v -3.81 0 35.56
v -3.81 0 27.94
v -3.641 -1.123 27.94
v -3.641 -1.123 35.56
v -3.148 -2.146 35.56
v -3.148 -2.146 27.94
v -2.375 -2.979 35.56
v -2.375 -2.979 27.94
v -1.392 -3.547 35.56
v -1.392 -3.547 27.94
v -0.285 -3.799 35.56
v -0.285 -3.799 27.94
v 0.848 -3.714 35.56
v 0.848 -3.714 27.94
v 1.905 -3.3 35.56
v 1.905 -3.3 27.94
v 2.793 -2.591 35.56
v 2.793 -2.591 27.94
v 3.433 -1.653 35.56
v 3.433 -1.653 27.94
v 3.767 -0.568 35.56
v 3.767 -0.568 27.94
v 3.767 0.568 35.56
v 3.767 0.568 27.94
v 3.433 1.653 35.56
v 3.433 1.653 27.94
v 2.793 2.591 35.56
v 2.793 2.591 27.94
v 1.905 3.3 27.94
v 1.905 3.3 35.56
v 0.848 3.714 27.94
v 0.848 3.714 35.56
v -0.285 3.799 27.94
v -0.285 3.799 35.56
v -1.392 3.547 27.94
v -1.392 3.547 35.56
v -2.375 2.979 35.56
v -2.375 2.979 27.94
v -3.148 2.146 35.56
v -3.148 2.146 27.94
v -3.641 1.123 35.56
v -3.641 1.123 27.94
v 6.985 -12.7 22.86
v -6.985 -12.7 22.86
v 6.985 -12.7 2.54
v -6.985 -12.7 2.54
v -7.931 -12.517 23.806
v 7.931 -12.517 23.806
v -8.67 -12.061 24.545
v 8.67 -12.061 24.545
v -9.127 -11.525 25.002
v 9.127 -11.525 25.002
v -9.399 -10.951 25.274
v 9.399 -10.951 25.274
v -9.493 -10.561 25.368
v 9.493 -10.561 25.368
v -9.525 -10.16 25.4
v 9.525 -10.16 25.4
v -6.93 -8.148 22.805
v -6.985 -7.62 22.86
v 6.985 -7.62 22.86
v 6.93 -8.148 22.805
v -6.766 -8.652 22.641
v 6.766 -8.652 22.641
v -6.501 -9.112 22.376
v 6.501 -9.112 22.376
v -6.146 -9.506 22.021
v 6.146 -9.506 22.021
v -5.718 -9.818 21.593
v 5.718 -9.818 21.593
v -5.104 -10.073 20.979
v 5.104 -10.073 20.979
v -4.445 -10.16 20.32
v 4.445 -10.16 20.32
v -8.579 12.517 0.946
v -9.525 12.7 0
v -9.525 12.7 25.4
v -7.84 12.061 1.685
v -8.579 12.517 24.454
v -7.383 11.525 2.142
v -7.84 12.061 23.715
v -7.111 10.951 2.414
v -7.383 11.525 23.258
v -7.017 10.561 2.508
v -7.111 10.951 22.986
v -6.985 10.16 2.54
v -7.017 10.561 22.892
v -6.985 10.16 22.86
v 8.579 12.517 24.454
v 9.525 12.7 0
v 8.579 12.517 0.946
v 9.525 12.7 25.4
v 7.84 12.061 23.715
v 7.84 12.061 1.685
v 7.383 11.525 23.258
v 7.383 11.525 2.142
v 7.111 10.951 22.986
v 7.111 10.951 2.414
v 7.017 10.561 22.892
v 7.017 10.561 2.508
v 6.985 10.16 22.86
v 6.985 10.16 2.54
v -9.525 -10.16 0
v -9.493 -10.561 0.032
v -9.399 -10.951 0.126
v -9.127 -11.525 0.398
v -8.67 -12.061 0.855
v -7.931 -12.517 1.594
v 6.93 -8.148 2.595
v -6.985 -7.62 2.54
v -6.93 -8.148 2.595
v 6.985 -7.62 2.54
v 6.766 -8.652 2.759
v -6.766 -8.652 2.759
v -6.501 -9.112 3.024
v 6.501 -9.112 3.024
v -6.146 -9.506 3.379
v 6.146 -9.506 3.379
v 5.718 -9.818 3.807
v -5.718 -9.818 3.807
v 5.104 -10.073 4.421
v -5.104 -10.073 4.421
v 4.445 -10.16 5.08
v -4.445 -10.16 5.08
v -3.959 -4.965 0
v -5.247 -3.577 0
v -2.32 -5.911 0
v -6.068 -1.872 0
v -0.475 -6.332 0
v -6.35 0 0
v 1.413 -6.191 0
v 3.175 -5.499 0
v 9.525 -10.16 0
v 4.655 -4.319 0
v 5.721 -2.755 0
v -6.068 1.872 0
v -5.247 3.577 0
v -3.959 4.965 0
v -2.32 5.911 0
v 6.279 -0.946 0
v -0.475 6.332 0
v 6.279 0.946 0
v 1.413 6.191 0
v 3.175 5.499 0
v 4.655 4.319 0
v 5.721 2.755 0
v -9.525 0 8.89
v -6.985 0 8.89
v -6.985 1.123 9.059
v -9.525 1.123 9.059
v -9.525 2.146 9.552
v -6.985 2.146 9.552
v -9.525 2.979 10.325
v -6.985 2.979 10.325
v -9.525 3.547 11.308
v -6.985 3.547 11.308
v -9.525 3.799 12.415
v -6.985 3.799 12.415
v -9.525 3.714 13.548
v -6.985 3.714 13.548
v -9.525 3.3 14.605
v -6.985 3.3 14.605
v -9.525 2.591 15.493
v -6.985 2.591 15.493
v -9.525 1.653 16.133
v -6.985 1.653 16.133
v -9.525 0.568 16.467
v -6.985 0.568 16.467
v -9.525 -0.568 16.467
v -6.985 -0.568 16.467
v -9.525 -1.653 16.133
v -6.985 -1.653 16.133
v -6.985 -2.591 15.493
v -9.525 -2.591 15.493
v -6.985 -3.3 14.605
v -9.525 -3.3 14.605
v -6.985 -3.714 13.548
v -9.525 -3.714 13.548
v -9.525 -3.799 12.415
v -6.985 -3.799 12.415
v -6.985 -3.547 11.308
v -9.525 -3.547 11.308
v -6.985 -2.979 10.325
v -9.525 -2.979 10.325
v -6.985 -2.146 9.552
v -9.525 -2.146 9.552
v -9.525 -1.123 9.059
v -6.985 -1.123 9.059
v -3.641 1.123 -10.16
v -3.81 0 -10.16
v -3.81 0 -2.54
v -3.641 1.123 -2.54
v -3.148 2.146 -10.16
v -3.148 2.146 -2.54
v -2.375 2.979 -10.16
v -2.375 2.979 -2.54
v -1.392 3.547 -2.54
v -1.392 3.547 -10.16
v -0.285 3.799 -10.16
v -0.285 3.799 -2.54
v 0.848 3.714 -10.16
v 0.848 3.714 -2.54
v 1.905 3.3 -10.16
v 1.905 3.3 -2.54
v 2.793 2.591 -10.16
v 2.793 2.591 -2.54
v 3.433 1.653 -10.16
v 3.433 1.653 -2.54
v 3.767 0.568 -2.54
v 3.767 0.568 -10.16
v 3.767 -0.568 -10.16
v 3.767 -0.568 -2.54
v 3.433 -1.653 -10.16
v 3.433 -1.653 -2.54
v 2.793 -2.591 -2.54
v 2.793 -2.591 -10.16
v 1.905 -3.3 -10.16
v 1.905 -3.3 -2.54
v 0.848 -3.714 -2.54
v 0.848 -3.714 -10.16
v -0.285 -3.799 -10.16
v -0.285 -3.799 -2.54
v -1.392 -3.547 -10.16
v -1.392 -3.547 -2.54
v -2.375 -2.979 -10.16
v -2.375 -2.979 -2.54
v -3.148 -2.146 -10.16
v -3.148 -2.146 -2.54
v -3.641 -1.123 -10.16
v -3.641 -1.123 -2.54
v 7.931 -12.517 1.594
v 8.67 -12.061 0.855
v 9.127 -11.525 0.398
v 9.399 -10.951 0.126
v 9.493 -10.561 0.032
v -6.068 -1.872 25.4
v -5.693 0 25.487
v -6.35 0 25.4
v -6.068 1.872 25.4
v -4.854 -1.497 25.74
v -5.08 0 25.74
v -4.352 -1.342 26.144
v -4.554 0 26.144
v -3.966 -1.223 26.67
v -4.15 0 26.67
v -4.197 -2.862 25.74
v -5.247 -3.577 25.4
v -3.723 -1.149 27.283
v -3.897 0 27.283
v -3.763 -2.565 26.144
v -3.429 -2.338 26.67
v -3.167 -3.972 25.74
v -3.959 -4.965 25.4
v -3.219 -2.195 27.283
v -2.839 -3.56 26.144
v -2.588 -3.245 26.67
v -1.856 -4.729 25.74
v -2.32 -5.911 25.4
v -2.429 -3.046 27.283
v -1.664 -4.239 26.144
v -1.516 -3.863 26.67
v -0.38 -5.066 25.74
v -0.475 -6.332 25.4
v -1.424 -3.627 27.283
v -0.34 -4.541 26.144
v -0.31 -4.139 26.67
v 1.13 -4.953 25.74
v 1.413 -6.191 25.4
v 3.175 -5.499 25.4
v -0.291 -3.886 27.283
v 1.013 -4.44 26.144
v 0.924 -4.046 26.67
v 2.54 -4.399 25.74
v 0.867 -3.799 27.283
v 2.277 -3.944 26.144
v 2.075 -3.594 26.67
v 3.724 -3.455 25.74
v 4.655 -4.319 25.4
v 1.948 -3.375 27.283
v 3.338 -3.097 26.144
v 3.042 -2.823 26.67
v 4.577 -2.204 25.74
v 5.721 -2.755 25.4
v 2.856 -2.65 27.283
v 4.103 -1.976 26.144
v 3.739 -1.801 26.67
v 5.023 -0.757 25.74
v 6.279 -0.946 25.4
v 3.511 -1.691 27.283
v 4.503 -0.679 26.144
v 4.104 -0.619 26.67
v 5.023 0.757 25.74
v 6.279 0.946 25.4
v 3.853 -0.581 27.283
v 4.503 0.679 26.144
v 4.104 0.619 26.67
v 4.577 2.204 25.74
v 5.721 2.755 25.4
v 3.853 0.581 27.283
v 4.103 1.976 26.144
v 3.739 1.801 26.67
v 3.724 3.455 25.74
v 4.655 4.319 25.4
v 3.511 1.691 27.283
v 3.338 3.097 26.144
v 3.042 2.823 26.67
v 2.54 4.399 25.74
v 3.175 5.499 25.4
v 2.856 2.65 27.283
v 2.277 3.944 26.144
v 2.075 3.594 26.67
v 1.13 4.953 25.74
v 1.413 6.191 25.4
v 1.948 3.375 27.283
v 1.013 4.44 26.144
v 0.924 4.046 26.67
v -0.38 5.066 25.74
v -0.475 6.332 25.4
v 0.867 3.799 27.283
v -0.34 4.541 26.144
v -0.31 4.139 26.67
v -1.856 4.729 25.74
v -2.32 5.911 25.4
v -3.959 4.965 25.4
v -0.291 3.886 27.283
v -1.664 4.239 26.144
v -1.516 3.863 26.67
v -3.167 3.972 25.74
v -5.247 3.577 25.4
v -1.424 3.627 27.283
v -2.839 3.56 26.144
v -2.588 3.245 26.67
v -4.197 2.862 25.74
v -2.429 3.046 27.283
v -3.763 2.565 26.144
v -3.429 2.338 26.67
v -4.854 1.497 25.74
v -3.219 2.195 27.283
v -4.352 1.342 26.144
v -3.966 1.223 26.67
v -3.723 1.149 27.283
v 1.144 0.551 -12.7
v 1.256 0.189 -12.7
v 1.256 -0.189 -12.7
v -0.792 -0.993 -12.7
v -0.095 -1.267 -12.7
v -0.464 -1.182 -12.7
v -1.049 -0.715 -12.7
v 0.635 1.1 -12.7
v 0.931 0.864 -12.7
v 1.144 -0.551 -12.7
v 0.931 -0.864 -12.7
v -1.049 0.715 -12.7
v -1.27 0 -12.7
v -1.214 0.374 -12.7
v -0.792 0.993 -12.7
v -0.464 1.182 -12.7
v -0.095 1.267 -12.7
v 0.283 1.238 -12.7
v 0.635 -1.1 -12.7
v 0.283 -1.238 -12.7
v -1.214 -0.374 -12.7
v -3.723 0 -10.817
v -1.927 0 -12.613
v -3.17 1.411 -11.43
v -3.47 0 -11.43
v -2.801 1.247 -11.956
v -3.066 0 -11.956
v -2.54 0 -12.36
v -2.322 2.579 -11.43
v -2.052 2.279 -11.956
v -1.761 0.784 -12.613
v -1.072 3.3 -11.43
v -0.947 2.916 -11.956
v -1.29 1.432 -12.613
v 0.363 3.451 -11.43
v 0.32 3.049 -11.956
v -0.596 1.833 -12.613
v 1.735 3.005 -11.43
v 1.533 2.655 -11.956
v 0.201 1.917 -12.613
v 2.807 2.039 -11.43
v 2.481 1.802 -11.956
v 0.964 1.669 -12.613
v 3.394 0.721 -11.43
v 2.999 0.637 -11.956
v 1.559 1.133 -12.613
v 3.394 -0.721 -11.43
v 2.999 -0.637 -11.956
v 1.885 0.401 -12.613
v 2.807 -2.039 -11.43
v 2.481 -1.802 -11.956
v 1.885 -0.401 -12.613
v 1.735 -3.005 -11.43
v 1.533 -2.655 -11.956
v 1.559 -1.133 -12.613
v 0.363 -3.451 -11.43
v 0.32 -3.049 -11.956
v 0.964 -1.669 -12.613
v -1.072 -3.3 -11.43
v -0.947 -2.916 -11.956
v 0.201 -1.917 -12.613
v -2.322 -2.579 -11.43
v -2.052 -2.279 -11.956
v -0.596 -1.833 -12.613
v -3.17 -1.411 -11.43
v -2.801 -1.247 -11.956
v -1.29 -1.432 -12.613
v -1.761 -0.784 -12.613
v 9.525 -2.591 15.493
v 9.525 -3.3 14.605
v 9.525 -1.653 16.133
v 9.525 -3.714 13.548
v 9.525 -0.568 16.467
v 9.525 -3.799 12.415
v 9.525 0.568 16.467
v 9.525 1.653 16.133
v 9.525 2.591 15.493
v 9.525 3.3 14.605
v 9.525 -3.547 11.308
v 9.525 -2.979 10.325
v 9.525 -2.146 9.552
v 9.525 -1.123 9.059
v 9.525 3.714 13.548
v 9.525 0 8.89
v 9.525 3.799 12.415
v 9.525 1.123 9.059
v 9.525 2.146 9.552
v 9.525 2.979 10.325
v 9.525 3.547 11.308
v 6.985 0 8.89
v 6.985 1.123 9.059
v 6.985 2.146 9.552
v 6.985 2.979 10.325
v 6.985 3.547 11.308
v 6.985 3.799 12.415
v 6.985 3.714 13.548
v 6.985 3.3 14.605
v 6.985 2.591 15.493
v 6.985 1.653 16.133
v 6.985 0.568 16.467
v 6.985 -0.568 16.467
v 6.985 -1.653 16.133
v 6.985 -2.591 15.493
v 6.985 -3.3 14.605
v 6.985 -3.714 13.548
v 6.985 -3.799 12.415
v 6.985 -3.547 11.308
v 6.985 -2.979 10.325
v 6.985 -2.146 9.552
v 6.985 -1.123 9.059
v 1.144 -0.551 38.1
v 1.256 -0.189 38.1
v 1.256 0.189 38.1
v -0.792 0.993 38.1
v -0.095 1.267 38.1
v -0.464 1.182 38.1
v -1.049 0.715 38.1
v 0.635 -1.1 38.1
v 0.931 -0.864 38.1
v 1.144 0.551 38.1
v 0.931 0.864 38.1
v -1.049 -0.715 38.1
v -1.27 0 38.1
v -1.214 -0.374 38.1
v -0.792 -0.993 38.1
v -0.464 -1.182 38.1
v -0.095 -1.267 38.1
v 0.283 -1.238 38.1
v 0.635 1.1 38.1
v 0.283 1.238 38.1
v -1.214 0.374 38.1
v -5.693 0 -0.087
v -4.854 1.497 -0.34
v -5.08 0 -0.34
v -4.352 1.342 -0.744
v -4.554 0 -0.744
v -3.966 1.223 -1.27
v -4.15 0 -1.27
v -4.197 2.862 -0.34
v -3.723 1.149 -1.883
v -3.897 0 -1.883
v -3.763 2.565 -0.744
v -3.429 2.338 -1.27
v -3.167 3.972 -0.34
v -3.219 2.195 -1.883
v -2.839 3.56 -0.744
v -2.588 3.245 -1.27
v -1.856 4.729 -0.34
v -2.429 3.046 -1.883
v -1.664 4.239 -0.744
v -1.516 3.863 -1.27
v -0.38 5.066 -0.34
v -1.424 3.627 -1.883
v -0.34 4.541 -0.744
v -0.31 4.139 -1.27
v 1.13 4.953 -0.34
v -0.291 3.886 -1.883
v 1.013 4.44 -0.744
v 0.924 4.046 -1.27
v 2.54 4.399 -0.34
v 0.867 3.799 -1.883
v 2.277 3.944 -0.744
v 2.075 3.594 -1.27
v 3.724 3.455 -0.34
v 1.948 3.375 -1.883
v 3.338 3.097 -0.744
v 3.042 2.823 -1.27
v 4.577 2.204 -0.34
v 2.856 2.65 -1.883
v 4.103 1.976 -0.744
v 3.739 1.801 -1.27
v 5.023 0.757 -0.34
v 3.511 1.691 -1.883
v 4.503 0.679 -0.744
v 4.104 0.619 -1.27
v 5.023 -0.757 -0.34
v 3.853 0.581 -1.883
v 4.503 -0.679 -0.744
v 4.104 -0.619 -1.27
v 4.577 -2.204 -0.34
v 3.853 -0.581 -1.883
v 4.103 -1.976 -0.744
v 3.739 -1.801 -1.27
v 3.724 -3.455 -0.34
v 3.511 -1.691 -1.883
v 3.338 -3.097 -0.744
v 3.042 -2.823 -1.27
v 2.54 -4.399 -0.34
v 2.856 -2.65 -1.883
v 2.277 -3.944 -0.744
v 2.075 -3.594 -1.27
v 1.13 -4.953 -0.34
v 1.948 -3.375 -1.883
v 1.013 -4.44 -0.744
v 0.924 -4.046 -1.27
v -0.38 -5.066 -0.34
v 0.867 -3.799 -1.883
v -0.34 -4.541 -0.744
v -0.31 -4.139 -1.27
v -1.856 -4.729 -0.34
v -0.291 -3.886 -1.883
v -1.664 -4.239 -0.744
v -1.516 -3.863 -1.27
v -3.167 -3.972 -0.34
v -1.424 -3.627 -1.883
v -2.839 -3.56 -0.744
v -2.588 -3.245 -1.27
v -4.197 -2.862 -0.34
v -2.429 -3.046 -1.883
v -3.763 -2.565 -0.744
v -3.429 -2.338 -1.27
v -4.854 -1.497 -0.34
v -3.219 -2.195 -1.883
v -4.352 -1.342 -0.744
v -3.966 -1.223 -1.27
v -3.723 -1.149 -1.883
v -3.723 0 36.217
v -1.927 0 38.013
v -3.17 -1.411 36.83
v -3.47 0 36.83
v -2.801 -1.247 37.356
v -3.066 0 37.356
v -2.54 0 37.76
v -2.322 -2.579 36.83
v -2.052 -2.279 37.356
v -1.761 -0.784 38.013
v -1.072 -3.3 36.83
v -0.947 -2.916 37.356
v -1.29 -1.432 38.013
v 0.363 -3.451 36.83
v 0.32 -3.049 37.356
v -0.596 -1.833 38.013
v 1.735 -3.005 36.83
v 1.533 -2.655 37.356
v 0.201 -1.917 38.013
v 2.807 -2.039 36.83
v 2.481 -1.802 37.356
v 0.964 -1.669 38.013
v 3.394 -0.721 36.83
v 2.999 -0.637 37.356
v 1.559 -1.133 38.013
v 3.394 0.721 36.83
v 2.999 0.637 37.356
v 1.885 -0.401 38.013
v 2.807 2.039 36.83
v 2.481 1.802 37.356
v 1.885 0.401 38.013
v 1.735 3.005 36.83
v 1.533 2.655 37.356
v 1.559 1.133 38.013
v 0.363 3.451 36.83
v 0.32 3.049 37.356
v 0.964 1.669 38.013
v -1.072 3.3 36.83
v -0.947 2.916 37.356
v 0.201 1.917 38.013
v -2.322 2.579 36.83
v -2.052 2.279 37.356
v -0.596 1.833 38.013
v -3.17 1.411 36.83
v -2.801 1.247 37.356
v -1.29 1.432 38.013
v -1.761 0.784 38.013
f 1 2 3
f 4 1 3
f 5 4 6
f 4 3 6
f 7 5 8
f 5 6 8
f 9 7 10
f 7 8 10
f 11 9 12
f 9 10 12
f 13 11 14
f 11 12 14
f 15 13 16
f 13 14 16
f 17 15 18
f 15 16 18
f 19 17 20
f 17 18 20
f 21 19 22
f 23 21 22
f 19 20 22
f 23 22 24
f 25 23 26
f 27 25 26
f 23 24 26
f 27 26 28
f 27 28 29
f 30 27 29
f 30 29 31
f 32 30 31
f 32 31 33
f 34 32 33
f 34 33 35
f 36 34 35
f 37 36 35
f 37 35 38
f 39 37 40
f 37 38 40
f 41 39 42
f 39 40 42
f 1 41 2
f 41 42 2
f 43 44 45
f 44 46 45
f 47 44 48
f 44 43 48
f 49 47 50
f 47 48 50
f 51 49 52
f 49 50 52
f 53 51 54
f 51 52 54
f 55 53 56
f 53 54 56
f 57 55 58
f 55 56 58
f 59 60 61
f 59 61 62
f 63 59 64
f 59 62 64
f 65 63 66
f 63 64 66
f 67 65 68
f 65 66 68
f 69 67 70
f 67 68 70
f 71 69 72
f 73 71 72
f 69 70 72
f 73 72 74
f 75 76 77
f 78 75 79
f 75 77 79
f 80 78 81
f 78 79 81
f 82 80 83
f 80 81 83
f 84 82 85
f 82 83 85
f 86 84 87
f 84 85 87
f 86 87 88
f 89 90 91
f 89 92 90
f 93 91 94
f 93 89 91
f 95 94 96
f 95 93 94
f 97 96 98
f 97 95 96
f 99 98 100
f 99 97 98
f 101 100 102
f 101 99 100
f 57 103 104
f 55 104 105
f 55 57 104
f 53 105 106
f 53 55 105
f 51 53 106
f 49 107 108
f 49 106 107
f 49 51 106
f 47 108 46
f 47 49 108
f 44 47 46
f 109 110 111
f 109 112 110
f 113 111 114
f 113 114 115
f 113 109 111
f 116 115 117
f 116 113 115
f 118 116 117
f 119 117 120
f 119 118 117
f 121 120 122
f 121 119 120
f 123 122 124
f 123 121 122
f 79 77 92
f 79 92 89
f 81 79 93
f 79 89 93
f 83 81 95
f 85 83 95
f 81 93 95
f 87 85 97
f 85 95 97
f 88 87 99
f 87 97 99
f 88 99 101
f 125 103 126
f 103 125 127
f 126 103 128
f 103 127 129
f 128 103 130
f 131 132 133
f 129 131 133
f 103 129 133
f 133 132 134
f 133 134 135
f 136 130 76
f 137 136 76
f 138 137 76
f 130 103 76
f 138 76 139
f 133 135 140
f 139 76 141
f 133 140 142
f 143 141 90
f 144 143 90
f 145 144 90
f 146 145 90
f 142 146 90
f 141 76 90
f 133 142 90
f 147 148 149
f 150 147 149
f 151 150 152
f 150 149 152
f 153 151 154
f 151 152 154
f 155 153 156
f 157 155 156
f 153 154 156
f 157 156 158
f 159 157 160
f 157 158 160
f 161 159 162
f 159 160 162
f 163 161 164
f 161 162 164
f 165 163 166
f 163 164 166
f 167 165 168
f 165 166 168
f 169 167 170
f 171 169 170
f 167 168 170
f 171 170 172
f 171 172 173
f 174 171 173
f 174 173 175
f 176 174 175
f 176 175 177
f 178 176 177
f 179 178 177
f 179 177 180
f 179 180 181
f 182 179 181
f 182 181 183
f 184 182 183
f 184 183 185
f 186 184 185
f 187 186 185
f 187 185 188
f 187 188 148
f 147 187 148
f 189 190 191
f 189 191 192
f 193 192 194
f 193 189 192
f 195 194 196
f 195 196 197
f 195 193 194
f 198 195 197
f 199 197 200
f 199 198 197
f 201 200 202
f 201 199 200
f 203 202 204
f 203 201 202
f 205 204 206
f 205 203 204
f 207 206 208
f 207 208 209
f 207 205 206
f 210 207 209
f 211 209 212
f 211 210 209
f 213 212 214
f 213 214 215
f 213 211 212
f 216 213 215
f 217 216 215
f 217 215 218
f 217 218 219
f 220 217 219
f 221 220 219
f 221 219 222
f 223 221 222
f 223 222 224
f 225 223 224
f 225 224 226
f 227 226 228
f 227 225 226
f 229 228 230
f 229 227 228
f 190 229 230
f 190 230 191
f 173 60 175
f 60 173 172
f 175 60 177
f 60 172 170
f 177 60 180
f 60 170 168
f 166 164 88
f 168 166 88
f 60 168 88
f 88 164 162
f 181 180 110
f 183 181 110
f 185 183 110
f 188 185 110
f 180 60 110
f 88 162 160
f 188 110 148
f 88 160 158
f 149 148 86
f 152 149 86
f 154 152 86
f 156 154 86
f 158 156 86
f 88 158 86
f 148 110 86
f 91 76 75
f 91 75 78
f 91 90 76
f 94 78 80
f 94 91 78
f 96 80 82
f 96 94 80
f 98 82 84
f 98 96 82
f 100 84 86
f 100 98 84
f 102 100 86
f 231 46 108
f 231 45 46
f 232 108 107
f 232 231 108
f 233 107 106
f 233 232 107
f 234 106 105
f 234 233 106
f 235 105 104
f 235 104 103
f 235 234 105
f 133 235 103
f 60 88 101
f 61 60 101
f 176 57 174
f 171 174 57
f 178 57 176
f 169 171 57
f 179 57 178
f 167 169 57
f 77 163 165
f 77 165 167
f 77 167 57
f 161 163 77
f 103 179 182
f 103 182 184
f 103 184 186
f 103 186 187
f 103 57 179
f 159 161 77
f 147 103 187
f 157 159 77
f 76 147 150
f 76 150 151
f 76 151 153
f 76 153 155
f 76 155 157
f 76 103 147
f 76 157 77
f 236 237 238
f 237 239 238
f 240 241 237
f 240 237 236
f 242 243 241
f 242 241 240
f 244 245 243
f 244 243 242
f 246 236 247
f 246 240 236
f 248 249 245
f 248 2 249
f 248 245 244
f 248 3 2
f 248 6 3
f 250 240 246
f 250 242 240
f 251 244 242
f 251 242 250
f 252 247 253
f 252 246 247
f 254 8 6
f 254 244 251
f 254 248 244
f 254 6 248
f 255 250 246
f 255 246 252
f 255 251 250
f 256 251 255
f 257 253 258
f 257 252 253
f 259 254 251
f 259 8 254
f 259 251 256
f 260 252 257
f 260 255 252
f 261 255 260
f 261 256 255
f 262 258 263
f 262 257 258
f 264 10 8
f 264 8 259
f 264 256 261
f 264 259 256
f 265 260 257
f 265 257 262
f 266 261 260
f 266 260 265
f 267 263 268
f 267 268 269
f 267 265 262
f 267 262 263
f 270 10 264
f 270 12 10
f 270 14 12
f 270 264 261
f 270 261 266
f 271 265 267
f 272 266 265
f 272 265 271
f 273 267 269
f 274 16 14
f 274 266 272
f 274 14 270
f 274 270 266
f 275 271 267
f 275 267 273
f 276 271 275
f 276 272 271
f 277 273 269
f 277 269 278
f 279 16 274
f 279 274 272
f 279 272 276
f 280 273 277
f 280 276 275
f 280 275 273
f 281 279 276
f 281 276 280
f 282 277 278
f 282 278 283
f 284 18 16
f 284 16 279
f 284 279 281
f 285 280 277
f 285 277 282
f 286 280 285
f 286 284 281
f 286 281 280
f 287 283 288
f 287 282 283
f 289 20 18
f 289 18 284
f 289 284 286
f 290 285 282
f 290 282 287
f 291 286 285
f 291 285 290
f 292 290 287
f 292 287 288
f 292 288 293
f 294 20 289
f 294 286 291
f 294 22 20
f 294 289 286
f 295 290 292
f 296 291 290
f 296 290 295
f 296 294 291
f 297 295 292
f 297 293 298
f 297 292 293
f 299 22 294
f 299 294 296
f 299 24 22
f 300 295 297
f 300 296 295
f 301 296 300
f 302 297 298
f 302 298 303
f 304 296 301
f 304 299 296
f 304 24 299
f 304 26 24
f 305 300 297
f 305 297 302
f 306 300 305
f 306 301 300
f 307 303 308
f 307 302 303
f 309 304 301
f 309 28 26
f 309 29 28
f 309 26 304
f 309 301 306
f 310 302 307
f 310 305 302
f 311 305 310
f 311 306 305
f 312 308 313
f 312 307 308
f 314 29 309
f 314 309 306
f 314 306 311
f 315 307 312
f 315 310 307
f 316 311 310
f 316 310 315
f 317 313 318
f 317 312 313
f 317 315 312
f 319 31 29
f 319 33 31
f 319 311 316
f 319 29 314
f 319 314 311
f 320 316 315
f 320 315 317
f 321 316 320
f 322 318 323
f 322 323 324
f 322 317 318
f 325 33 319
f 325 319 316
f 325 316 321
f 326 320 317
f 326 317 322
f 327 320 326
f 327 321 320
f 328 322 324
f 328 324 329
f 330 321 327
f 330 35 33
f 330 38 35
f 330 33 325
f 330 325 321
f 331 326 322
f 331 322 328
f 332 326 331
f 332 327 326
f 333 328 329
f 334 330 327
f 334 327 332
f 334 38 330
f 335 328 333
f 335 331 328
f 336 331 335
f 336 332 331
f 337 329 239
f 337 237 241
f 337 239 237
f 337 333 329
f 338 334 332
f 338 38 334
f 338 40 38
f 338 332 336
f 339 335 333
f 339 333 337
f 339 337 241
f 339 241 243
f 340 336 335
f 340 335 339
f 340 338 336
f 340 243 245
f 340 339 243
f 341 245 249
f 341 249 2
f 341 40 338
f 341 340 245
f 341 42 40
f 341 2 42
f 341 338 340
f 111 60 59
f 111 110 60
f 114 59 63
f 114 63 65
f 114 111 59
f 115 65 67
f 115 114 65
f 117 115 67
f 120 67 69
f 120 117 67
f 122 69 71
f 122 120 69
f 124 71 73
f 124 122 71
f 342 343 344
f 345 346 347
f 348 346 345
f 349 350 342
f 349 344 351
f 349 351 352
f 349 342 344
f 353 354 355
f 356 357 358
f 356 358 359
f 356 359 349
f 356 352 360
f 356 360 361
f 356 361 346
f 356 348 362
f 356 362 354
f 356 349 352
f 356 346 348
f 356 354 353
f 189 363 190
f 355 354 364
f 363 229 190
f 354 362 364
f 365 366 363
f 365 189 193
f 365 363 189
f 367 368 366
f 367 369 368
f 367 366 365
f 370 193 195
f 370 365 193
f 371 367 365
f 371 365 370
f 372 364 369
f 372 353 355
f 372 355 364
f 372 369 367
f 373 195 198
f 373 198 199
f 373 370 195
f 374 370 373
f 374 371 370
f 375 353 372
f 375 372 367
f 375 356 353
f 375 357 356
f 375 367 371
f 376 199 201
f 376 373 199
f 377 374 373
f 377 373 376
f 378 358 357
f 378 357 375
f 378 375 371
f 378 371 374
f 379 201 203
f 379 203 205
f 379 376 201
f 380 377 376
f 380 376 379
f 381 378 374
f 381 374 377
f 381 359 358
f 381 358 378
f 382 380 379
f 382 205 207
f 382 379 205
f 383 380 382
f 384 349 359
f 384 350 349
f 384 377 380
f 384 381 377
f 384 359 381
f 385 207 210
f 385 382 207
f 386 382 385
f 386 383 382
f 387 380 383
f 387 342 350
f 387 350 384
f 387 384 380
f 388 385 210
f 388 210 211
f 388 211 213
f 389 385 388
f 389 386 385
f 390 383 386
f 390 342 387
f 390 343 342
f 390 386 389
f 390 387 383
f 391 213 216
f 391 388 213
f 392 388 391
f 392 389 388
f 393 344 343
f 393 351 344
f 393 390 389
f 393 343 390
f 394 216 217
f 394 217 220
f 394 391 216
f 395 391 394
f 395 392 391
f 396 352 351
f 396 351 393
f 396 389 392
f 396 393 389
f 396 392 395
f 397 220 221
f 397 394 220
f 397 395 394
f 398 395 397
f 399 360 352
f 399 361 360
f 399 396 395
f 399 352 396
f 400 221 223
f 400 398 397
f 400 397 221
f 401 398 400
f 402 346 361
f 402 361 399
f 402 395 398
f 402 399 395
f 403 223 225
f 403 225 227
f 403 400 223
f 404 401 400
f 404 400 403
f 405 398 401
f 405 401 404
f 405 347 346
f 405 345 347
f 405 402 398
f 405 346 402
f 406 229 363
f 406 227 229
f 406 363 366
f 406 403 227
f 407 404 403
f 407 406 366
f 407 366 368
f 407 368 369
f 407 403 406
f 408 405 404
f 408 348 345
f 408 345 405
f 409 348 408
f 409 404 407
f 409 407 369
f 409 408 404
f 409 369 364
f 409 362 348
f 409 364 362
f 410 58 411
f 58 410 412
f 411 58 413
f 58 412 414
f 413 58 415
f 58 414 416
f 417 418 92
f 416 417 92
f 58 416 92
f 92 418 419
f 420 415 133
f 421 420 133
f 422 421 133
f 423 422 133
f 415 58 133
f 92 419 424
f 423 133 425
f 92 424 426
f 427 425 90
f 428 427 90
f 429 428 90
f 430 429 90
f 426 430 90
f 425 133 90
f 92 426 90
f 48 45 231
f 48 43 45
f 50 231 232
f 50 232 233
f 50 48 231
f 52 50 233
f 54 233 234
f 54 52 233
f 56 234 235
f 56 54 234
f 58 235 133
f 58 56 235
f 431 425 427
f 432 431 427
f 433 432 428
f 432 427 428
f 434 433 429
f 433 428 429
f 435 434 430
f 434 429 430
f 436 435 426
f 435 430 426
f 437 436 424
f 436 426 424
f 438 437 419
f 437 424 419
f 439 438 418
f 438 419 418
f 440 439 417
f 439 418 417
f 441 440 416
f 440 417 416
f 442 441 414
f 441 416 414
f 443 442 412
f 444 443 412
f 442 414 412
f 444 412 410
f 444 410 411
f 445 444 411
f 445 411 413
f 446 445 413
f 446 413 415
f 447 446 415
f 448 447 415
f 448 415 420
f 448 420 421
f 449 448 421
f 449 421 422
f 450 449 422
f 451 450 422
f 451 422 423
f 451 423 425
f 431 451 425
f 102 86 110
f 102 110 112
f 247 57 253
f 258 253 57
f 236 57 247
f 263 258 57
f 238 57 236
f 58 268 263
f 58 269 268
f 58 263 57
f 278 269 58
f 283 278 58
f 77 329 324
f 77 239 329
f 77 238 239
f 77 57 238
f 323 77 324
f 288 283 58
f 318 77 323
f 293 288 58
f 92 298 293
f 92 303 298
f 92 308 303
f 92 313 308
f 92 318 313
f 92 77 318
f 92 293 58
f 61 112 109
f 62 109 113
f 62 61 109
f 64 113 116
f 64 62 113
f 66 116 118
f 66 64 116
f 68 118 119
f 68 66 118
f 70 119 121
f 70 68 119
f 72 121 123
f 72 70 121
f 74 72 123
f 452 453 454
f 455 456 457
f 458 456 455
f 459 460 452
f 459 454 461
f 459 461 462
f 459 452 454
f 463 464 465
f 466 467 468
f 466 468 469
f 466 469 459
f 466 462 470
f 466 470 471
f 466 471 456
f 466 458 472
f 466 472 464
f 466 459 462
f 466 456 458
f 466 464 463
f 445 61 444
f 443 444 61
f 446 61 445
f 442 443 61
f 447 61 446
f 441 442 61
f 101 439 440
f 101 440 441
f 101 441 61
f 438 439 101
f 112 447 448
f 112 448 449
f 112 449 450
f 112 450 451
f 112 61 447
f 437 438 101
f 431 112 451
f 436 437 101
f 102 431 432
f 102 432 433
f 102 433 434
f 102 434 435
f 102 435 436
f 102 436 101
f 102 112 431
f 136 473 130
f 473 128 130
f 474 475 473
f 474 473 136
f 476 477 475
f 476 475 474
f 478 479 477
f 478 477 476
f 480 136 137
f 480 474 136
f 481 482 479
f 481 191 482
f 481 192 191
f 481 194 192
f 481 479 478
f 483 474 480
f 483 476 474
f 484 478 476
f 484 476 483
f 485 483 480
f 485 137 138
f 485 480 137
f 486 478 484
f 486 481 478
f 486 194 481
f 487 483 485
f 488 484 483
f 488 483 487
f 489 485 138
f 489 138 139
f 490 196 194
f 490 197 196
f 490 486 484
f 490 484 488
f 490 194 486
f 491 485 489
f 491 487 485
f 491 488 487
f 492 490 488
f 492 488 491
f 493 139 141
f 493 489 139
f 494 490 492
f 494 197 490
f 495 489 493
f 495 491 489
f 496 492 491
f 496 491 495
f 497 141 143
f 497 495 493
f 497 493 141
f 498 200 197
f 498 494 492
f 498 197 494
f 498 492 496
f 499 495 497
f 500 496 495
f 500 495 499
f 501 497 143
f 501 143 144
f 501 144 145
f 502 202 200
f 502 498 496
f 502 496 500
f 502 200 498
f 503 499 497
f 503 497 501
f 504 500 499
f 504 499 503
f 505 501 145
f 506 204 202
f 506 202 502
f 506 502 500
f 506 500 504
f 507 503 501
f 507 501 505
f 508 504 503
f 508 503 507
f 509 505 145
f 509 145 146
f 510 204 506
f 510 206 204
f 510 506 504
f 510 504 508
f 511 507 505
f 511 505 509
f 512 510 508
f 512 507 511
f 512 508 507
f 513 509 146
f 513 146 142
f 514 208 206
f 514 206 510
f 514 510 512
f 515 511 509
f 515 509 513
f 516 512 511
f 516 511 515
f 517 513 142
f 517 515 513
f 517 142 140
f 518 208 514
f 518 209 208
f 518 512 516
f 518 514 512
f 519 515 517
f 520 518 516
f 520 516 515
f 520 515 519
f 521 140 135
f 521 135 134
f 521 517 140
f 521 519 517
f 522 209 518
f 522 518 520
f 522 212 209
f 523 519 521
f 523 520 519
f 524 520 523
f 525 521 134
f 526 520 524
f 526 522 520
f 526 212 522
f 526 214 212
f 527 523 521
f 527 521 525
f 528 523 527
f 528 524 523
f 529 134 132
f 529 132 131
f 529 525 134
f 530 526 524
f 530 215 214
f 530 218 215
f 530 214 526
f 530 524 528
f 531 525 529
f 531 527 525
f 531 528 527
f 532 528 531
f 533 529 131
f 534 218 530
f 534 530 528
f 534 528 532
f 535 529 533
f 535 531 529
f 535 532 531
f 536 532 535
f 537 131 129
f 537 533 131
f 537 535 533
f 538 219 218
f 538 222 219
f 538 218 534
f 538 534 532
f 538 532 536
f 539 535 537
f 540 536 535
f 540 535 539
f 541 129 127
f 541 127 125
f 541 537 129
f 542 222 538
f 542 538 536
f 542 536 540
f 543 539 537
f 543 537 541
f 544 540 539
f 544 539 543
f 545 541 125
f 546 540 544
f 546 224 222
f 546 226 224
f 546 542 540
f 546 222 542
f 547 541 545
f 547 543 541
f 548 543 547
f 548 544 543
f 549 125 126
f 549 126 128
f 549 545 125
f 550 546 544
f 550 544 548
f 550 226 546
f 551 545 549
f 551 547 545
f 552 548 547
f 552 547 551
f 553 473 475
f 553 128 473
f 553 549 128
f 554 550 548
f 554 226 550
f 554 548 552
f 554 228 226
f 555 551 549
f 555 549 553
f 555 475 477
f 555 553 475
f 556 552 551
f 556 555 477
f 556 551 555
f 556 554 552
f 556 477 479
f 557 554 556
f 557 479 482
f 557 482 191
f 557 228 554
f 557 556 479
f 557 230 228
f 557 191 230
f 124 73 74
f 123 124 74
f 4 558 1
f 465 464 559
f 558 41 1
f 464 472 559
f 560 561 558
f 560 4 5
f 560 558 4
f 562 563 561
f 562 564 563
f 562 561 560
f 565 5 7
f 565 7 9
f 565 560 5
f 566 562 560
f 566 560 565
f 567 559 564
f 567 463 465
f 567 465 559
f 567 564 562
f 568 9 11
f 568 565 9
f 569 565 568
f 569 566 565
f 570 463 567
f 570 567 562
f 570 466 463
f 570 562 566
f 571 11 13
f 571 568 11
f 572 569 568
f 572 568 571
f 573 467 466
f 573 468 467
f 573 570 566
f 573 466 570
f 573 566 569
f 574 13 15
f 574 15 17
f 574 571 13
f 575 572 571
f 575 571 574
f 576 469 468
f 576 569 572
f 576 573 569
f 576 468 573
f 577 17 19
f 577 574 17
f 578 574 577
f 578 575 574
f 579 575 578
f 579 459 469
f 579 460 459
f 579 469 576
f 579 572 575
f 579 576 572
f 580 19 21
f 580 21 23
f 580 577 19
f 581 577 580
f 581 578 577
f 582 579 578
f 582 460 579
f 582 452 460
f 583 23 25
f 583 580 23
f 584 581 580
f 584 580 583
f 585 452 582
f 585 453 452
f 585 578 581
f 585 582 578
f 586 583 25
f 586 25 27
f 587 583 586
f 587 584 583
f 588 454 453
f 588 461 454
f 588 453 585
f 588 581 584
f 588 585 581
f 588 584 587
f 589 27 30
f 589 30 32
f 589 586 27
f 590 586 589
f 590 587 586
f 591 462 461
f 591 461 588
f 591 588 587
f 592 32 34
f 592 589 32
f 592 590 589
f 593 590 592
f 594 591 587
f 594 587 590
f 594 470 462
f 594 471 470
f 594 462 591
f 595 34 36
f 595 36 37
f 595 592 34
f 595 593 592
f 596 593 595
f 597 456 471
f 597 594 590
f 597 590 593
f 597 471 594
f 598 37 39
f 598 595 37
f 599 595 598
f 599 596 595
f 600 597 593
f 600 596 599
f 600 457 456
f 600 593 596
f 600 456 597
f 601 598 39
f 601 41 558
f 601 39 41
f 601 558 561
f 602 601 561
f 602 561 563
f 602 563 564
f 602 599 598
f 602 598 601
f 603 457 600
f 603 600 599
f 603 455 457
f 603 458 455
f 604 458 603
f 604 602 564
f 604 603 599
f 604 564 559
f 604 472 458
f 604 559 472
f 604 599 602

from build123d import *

# Parameters (mm, degrees)
SKETCH1_W          = 19.05
SKETCH1_H          = 25.4
MAIN_BODY_DEPTH    = 25.4
HOLLOW_IT_T        = -2.54
SKETCH3_R          = 3.81
NIBBLE_NO_1_DEPTH  = 12.7
NIBBLE_START       = 12.7
SKETCH4_R          = 3.81
NIBBLE_NO_2_DEPTH  = 12.7
SKETCH5_W          = 1.27
SKETCH5_H          = 3.81
FLAG_DEPTH         = 0.254
SKETCH2_R          = 3.81
NIBBLE_HOLES_DEPTH = 45.45
SMOOTHNESS_R       = 2.54


with BuildPart() as part:
    # Sketch1 → main body (new body)
    with BuildSketch(Plane.XY):
        Rectangle(SKETCH1_W, SKETCH1_H)
    extrude(amount=MAIN_BODY_DEPTH)

    # hollow it
    hollow_it_openings = [part.faces().sort_by_distance(p)[0] for p in [
        (0, 12.7, 12.7),
    ]]
    offset(amount=HOLLOW_IT_T, openings=hollow_it_openings, kind=Kind.INTERSECTION)

    # Sketch3 → nibble no 1 (add)
    with BuildSketch(Plane.XY.offset(25.4)):
        with Locations(Location((0, 0, 0), (0, 0, 180))):
            Circle(SKETCH3_R)
    extrude(amount=NIBBLE_NO_1_DEPTH)

    # Sketch4 → nibble no 2 (add)
    with BuildSketch(Plane(origin=(0, 0, 0), x_dir=(-1, 0, 0), z_dir=(0, 0, -1)).offset(NIBBLE_START)):
        Circle(SKETCH4_R)
    extrude(amount=-NIBBLE_NO_2_DEPTH)

    # Sketch5 → flag (add)
    with BuildSketch(Plane(origin=(0, 0, 0), x_dir=(-1, 0, 0), z_dir=(0, -1, 0))):
        with Locations((-0.18666561, 6.353298227)):
            Rectangle(SKETCH5_W, SKETCH5_H)
    extrude(amount=FLAG_DEPTH)

    # Sketch2 → nibble holes (cut, through all)
    with BuildSketch(Plane(origin=(9.525, 0, 0), x_dir=(0, 0, -1), z_dir=(1, 0, 0))):
        with Locations((-12.7, 0)):
            Circle(SKETCH2_R)
    extrude(amount=-NIBBLE_HOLES_DEPTH, mode=Mode.SUBTRACT)

    # smoothness
    smoothness_edges = [part.edges().sort_by_distance(p)[0] for p in [
        (0, -12.7, 25.4),
        (6.985, -10.16, 12.7),
        (0, 12.7, 2.54),
        (6.985, 12.7, 12.7),
        (-6.985, 12.7, 12.7),
        (0, -10.16, 2.54),
        (-6.985, -10.16, 12.7),
        (0, 12.7, 22.86),
        (0, -10.16, 22.86),
        (3.81, 0, 25.4),
        (3.81, 0, 38.1),
        (3.81, 0, 0),
        (3.81, 0, -12.7),
        (0, -12.7, 0),
        (9.525, -12.7, 12.7),
        (-9.525, -12.7, 12.7),
    ]]
    fillet(smoothness_edges, radius=SMOOTHNESS_R - 0.0001)  # a hair under: the kernel refuses the full size


solid = part.part
